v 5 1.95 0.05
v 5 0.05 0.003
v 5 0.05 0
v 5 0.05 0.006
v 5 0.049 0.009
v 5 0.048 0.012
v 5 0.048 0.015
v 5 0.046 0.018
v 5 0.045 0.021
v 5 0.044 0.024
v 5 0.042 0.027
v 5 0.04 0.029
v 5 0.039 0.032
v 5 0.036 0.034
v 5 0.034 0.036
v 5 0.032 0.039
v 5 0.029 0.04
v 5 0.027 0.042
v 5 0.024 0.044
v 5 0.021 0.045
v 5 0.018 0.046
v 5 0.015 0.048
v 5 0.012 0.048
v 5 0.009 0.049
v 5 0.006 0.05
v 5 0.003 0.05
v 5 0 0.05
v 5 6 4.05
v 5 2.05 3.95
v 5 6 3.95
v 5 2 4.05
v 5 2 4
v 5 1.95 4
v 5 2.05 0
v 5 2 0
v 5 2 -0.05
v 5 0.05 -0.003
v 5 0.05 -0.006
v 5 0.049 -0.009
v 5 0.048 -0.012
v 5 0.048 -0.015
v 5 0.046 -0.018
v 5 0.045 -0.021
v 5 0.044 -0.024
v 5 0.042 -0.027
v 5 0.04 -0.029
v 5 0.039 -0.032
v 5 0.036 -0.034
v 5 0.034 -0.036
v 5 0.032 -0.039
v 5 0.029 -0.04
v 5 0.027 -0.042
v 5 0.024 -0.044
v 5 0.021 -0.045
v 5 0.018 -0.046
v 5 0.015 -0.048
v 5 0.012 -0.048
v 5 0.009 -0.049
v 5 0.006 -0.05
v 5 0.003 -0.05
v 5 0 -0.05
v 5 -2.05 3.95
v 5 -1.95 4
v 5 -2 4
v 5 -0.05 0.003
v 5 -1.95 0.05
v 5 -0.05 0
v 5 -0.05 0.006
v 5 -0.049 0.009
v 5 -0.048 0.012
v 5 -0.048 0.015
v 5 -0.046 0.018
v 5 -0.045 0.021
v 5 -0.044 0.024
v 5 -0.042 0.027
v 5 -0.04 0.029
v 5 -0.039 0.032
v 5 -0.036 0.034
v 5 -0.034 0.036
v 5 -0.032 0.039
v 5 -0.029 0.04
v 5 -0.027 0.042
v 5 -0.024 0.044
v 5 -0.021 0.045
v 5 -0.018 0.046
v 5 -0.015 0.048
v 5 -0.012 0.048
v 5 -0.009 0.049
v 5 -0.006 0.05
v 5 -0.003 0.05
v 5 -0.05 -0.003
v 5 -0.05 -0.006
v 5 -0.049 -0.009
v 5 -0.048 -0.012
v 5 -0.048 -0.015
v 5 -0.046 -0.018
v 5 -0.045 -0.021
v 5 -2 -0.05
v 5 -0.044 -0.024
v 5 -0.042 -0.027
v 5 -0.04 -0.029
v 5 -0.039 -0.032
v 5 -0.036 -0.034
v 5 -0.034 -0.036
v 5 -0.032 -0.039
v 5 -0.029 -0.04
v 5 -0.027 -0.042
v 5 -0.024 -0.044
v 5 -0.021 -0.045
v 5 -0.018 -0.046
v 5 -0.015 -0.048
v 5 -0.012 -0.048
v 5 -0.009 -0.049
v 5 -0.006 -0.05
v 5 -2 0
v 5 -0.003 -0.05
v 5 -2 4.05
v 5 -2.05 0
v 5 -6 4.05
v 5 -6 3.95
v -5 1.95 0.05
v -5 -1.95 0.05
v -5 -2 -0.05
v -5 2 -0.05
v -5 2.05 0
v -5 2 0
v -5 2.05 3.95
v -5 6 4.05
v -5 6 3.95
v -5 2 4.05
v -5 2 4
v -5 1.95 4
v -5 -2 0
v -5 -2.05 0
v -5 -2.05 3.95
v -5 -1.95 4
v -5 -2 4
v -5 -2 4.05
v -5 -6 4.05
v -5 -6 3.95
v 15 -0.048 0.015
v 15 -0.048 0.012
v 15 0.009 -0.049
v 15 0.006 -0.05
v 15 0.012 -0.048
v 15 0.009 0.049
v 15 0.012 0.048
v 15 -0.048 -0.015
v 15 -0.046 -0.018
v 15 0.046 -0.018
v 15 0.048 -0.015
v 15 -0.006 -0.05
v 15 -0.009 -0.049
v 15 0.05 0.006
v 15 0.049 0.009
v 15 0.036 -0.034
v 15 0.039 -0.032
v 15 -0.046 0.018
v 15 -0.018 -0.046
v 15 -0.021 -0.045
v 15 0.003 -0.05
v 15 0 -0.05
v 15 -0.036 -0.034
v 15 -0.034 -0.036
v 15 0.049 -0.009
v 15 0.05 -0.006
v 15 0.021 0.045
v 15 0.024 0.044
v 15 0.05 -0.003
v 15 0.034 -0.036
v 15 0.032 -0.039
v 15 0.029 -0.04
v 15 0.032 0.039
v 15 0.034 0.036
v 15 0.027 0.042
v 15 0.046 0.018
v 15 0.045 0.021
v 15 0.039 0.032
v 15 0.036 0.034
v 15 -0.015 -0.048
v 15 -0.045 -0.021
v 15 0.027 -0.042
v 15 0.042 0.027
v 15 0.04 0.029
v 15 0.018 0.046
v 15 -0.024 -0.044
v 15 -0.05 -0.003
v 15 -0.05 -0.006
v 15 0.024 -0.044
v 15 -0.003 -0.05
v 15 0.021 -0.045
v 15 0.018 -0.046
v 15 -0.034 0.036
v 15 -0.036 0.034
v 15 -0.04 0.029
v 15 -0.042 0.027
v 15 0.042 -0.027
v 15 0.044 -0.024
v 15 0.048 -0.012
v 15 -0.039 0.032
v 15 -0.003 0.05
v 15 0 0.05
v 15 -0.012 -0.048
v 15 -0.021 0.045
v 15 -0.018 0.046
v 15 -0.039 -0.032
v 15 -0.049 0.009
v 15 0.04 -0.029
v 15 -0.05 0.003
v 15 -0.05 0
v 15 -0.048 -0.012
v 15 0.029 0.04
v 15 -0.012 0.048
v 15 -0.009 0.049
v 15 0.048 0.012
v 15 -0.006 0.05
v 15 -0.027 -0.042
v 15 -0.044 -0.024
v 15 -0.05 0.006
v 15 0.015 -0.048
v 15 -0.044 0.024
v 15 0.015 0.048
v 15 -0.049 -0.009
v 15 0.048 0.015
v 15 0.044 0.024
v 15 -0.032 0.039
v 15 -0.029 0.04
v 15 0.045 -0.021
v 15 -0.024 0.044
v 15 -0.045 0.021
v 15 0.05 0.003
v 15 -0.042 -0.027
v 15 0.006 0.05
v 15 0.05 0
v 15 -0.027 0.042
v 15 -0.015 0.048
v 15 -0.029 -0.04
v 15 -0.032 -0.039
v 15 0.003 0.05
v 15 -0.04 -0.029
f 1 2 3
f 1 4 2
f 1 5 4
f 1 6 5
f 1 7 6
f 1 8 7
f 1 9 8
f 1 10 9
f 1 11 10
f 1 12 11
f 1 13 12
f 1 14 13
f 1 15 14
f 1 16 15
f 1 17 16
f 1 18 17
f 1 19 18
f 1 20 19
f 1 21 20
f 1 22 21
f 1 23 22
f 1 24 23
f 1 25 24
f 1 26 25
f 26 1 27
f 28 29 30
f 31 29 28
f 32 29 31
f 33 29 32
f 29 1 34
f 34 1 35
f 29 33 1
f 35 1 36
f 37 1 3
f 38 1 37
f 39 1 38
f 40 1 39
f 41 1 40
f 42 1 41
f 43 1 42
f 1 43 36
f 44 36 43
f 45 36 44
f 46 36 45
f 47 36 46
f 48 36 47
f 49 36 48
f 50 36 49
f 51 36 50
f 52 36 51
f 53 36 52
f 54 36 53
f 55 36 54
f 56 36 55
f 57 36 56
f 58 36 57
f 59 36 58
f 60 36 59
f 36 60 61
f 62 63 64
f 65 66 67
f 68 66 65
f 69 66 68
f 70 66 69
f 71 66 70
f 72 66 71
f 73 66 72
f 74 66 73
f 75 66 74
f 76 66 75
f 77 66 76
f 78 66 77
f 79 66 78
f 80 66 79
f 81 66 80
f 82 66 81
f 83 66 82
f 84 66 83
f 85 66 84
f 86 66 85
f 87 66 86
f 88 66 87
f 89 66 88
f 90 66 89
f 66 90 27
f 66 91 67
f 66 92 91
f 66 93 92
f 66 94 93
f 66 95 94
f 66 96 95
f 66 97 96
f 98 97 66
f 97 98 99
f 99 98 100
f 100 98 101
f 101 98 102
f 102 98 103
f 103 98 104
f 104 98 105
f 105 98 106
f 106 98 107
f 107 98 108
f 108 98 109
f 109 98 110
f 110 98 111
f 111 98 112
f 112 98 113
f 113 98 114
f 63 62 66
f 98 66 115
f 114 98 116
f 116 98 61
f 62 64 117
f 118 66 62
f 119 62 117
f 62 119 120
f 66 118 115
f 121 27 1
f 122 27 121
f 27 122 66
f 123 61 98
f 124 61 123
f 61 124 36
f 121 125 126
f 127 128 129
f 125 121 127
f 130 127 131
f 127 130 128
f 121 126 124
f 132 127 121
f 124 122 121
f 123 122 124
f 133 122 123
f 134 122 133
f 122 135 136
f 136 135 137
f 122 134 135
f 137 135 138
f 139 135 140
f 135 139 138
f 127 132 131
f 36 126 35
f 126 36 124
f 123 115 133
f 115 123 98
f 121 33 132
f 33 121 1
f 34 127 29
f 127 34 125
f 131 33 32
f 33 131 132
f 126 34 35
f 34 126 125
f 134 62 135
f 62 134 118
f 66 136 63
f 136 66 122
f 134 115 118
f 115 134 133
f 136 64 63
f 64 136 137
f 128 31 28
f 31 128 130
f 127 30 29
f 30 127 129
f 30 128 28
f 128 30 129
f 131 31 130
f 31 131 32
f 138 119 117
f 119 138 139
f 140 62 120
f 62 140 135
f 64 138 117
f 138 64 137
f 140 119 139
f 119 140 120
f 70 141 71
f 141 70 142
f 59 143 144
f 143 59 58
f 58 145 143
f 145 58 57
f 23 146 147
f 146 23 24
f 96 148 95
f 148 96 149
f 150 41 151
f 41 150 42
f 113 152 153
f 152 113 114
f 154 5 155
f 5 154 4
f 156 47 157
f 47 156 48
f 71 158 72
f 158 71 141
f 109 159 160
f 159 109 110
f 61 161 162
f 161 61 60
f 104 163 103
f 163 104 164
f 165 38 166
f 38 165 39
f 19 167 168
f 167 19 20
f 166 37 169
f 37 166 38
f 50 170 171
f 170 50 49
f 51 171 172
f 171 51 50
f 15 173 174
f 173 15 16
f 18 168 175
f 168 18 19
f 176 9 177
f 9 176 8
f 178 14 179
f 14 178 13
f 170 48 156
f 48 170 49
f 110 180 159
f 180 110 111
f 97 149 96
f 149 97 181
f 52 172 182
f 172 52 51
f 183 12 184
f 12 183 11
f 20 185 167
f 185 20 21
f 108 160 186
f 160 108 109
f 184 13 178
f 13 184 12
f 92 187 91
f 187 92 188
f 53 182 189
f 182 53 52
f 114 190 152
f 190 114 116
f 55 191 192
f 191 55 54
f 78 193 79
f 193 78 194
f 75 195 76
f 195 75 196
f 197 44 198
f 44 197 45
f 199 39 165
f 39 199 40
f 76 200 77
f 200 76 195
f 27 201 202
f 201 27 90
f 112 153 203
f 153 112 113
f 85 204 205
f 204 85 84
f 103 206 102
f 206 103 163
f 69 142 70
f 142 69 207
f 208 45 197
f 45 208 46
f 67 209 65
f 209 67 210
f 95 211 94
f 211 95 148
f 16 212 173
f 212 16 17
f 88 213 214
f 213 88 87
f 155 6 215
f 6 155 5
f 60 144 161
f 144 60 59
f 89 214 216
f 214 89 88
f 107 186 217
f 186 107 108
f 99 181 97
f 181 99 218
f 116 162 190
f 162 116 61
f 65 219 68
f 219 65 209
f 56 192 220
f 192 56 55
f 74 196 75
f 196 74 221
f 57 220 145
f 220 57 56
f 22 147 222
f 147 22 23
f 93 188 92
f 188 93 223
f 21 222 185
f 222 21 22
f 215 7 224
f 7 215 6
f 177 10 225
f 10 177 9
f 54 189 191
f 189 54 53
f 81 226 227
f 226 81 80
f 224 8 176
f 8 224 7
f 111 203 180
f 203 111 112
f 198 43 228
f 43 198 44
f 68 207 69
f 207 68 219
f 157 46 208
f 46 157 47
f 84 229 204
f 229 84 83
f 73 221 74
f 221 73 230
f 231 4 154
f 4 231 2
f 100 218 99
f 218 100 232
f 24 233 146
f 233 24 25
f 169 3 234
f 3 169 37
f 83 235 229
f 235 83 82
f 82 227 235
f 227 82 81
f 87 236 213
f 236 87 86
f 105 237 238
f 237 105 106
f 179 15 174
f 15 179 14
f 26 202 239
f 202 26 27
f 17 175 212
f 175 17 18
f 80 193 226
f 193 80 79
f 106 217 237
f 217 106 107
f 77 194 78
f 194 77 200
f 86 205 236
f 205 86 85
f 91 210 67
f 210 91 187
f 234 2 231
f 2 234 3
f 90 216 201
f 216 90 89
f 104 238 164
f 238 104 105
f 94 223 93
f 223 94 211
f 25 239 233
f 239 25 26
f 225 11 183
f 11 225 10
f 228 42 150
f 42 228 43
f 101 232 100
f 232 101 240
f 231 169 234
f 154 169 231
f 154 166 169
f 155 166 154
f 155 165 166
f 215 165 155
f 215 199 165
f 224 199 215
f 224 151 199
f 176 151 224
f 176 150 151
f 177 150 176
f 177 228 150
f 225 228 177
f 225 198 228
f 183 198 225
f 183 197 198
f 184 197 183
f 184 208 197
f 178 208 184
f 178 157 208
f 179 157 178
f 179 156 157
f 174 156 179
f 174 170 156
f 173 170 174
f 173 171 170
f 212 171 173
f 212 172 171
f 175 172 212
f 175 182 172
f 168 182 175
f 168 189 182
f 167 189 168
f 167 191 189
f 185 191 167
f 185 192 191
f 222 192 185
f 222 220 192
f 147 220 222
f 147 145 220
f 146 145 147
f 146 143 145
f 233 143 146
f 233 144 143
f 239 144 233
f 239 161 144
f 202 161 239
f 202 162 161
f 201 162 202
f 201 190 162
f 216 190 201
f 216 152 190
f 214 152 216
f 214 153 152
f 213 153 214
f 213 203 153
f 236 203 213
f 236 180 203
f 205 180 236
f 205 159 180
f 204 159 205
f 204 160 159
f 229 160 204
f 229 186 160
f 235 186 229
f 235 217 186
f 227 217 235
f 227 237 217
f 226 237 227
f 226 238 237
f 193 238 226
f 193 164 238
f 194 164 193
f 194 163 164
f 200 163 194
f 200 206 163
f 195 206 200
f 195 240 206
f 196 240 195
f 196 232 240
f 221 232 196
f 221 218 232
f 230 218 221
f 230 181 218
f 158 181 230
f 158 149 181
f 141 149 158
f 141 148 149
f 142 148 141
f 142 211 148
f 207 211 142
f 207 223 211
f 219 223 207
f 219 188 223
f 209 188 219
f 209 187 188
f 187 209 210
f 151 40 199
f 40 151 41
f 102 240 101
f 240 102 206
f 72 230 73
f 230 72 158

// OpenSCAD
// Var in mm
l = 10;
w = 4;
h = 4;
wr_l = 0.3;
wr_w = 2;
pr_r = 0.1;
t = 0.1;

module bed(length,width){cube([l, w, t], true);}
module side(pos){rotate([90,0,0]){if(pos== 1){translate([0,(h/2),((w/-2))]){bed(l,h);}}else if(pos ==0){translate([0,(h/2),((w/2))]){bed(l,h);}}}}
module wing(pos){if(pos == 1){translate([0,h,w]){bed(wr_l,wr_w);}}else if(pos == 0){translate([0,-h,w]){bed(wr_l,wr_w);}}}
module proboscis_rest(pr_h)translate([(l/2),0,0]){
    rotate([90,90,90]){cylinder(pr_h,r1 = (t/2), r2 =(t/2), centre =false,$fn=100);}}

bed(l,w);
side(1);side(0);
wing(1);wing(0);
proboscis_rest(10);
